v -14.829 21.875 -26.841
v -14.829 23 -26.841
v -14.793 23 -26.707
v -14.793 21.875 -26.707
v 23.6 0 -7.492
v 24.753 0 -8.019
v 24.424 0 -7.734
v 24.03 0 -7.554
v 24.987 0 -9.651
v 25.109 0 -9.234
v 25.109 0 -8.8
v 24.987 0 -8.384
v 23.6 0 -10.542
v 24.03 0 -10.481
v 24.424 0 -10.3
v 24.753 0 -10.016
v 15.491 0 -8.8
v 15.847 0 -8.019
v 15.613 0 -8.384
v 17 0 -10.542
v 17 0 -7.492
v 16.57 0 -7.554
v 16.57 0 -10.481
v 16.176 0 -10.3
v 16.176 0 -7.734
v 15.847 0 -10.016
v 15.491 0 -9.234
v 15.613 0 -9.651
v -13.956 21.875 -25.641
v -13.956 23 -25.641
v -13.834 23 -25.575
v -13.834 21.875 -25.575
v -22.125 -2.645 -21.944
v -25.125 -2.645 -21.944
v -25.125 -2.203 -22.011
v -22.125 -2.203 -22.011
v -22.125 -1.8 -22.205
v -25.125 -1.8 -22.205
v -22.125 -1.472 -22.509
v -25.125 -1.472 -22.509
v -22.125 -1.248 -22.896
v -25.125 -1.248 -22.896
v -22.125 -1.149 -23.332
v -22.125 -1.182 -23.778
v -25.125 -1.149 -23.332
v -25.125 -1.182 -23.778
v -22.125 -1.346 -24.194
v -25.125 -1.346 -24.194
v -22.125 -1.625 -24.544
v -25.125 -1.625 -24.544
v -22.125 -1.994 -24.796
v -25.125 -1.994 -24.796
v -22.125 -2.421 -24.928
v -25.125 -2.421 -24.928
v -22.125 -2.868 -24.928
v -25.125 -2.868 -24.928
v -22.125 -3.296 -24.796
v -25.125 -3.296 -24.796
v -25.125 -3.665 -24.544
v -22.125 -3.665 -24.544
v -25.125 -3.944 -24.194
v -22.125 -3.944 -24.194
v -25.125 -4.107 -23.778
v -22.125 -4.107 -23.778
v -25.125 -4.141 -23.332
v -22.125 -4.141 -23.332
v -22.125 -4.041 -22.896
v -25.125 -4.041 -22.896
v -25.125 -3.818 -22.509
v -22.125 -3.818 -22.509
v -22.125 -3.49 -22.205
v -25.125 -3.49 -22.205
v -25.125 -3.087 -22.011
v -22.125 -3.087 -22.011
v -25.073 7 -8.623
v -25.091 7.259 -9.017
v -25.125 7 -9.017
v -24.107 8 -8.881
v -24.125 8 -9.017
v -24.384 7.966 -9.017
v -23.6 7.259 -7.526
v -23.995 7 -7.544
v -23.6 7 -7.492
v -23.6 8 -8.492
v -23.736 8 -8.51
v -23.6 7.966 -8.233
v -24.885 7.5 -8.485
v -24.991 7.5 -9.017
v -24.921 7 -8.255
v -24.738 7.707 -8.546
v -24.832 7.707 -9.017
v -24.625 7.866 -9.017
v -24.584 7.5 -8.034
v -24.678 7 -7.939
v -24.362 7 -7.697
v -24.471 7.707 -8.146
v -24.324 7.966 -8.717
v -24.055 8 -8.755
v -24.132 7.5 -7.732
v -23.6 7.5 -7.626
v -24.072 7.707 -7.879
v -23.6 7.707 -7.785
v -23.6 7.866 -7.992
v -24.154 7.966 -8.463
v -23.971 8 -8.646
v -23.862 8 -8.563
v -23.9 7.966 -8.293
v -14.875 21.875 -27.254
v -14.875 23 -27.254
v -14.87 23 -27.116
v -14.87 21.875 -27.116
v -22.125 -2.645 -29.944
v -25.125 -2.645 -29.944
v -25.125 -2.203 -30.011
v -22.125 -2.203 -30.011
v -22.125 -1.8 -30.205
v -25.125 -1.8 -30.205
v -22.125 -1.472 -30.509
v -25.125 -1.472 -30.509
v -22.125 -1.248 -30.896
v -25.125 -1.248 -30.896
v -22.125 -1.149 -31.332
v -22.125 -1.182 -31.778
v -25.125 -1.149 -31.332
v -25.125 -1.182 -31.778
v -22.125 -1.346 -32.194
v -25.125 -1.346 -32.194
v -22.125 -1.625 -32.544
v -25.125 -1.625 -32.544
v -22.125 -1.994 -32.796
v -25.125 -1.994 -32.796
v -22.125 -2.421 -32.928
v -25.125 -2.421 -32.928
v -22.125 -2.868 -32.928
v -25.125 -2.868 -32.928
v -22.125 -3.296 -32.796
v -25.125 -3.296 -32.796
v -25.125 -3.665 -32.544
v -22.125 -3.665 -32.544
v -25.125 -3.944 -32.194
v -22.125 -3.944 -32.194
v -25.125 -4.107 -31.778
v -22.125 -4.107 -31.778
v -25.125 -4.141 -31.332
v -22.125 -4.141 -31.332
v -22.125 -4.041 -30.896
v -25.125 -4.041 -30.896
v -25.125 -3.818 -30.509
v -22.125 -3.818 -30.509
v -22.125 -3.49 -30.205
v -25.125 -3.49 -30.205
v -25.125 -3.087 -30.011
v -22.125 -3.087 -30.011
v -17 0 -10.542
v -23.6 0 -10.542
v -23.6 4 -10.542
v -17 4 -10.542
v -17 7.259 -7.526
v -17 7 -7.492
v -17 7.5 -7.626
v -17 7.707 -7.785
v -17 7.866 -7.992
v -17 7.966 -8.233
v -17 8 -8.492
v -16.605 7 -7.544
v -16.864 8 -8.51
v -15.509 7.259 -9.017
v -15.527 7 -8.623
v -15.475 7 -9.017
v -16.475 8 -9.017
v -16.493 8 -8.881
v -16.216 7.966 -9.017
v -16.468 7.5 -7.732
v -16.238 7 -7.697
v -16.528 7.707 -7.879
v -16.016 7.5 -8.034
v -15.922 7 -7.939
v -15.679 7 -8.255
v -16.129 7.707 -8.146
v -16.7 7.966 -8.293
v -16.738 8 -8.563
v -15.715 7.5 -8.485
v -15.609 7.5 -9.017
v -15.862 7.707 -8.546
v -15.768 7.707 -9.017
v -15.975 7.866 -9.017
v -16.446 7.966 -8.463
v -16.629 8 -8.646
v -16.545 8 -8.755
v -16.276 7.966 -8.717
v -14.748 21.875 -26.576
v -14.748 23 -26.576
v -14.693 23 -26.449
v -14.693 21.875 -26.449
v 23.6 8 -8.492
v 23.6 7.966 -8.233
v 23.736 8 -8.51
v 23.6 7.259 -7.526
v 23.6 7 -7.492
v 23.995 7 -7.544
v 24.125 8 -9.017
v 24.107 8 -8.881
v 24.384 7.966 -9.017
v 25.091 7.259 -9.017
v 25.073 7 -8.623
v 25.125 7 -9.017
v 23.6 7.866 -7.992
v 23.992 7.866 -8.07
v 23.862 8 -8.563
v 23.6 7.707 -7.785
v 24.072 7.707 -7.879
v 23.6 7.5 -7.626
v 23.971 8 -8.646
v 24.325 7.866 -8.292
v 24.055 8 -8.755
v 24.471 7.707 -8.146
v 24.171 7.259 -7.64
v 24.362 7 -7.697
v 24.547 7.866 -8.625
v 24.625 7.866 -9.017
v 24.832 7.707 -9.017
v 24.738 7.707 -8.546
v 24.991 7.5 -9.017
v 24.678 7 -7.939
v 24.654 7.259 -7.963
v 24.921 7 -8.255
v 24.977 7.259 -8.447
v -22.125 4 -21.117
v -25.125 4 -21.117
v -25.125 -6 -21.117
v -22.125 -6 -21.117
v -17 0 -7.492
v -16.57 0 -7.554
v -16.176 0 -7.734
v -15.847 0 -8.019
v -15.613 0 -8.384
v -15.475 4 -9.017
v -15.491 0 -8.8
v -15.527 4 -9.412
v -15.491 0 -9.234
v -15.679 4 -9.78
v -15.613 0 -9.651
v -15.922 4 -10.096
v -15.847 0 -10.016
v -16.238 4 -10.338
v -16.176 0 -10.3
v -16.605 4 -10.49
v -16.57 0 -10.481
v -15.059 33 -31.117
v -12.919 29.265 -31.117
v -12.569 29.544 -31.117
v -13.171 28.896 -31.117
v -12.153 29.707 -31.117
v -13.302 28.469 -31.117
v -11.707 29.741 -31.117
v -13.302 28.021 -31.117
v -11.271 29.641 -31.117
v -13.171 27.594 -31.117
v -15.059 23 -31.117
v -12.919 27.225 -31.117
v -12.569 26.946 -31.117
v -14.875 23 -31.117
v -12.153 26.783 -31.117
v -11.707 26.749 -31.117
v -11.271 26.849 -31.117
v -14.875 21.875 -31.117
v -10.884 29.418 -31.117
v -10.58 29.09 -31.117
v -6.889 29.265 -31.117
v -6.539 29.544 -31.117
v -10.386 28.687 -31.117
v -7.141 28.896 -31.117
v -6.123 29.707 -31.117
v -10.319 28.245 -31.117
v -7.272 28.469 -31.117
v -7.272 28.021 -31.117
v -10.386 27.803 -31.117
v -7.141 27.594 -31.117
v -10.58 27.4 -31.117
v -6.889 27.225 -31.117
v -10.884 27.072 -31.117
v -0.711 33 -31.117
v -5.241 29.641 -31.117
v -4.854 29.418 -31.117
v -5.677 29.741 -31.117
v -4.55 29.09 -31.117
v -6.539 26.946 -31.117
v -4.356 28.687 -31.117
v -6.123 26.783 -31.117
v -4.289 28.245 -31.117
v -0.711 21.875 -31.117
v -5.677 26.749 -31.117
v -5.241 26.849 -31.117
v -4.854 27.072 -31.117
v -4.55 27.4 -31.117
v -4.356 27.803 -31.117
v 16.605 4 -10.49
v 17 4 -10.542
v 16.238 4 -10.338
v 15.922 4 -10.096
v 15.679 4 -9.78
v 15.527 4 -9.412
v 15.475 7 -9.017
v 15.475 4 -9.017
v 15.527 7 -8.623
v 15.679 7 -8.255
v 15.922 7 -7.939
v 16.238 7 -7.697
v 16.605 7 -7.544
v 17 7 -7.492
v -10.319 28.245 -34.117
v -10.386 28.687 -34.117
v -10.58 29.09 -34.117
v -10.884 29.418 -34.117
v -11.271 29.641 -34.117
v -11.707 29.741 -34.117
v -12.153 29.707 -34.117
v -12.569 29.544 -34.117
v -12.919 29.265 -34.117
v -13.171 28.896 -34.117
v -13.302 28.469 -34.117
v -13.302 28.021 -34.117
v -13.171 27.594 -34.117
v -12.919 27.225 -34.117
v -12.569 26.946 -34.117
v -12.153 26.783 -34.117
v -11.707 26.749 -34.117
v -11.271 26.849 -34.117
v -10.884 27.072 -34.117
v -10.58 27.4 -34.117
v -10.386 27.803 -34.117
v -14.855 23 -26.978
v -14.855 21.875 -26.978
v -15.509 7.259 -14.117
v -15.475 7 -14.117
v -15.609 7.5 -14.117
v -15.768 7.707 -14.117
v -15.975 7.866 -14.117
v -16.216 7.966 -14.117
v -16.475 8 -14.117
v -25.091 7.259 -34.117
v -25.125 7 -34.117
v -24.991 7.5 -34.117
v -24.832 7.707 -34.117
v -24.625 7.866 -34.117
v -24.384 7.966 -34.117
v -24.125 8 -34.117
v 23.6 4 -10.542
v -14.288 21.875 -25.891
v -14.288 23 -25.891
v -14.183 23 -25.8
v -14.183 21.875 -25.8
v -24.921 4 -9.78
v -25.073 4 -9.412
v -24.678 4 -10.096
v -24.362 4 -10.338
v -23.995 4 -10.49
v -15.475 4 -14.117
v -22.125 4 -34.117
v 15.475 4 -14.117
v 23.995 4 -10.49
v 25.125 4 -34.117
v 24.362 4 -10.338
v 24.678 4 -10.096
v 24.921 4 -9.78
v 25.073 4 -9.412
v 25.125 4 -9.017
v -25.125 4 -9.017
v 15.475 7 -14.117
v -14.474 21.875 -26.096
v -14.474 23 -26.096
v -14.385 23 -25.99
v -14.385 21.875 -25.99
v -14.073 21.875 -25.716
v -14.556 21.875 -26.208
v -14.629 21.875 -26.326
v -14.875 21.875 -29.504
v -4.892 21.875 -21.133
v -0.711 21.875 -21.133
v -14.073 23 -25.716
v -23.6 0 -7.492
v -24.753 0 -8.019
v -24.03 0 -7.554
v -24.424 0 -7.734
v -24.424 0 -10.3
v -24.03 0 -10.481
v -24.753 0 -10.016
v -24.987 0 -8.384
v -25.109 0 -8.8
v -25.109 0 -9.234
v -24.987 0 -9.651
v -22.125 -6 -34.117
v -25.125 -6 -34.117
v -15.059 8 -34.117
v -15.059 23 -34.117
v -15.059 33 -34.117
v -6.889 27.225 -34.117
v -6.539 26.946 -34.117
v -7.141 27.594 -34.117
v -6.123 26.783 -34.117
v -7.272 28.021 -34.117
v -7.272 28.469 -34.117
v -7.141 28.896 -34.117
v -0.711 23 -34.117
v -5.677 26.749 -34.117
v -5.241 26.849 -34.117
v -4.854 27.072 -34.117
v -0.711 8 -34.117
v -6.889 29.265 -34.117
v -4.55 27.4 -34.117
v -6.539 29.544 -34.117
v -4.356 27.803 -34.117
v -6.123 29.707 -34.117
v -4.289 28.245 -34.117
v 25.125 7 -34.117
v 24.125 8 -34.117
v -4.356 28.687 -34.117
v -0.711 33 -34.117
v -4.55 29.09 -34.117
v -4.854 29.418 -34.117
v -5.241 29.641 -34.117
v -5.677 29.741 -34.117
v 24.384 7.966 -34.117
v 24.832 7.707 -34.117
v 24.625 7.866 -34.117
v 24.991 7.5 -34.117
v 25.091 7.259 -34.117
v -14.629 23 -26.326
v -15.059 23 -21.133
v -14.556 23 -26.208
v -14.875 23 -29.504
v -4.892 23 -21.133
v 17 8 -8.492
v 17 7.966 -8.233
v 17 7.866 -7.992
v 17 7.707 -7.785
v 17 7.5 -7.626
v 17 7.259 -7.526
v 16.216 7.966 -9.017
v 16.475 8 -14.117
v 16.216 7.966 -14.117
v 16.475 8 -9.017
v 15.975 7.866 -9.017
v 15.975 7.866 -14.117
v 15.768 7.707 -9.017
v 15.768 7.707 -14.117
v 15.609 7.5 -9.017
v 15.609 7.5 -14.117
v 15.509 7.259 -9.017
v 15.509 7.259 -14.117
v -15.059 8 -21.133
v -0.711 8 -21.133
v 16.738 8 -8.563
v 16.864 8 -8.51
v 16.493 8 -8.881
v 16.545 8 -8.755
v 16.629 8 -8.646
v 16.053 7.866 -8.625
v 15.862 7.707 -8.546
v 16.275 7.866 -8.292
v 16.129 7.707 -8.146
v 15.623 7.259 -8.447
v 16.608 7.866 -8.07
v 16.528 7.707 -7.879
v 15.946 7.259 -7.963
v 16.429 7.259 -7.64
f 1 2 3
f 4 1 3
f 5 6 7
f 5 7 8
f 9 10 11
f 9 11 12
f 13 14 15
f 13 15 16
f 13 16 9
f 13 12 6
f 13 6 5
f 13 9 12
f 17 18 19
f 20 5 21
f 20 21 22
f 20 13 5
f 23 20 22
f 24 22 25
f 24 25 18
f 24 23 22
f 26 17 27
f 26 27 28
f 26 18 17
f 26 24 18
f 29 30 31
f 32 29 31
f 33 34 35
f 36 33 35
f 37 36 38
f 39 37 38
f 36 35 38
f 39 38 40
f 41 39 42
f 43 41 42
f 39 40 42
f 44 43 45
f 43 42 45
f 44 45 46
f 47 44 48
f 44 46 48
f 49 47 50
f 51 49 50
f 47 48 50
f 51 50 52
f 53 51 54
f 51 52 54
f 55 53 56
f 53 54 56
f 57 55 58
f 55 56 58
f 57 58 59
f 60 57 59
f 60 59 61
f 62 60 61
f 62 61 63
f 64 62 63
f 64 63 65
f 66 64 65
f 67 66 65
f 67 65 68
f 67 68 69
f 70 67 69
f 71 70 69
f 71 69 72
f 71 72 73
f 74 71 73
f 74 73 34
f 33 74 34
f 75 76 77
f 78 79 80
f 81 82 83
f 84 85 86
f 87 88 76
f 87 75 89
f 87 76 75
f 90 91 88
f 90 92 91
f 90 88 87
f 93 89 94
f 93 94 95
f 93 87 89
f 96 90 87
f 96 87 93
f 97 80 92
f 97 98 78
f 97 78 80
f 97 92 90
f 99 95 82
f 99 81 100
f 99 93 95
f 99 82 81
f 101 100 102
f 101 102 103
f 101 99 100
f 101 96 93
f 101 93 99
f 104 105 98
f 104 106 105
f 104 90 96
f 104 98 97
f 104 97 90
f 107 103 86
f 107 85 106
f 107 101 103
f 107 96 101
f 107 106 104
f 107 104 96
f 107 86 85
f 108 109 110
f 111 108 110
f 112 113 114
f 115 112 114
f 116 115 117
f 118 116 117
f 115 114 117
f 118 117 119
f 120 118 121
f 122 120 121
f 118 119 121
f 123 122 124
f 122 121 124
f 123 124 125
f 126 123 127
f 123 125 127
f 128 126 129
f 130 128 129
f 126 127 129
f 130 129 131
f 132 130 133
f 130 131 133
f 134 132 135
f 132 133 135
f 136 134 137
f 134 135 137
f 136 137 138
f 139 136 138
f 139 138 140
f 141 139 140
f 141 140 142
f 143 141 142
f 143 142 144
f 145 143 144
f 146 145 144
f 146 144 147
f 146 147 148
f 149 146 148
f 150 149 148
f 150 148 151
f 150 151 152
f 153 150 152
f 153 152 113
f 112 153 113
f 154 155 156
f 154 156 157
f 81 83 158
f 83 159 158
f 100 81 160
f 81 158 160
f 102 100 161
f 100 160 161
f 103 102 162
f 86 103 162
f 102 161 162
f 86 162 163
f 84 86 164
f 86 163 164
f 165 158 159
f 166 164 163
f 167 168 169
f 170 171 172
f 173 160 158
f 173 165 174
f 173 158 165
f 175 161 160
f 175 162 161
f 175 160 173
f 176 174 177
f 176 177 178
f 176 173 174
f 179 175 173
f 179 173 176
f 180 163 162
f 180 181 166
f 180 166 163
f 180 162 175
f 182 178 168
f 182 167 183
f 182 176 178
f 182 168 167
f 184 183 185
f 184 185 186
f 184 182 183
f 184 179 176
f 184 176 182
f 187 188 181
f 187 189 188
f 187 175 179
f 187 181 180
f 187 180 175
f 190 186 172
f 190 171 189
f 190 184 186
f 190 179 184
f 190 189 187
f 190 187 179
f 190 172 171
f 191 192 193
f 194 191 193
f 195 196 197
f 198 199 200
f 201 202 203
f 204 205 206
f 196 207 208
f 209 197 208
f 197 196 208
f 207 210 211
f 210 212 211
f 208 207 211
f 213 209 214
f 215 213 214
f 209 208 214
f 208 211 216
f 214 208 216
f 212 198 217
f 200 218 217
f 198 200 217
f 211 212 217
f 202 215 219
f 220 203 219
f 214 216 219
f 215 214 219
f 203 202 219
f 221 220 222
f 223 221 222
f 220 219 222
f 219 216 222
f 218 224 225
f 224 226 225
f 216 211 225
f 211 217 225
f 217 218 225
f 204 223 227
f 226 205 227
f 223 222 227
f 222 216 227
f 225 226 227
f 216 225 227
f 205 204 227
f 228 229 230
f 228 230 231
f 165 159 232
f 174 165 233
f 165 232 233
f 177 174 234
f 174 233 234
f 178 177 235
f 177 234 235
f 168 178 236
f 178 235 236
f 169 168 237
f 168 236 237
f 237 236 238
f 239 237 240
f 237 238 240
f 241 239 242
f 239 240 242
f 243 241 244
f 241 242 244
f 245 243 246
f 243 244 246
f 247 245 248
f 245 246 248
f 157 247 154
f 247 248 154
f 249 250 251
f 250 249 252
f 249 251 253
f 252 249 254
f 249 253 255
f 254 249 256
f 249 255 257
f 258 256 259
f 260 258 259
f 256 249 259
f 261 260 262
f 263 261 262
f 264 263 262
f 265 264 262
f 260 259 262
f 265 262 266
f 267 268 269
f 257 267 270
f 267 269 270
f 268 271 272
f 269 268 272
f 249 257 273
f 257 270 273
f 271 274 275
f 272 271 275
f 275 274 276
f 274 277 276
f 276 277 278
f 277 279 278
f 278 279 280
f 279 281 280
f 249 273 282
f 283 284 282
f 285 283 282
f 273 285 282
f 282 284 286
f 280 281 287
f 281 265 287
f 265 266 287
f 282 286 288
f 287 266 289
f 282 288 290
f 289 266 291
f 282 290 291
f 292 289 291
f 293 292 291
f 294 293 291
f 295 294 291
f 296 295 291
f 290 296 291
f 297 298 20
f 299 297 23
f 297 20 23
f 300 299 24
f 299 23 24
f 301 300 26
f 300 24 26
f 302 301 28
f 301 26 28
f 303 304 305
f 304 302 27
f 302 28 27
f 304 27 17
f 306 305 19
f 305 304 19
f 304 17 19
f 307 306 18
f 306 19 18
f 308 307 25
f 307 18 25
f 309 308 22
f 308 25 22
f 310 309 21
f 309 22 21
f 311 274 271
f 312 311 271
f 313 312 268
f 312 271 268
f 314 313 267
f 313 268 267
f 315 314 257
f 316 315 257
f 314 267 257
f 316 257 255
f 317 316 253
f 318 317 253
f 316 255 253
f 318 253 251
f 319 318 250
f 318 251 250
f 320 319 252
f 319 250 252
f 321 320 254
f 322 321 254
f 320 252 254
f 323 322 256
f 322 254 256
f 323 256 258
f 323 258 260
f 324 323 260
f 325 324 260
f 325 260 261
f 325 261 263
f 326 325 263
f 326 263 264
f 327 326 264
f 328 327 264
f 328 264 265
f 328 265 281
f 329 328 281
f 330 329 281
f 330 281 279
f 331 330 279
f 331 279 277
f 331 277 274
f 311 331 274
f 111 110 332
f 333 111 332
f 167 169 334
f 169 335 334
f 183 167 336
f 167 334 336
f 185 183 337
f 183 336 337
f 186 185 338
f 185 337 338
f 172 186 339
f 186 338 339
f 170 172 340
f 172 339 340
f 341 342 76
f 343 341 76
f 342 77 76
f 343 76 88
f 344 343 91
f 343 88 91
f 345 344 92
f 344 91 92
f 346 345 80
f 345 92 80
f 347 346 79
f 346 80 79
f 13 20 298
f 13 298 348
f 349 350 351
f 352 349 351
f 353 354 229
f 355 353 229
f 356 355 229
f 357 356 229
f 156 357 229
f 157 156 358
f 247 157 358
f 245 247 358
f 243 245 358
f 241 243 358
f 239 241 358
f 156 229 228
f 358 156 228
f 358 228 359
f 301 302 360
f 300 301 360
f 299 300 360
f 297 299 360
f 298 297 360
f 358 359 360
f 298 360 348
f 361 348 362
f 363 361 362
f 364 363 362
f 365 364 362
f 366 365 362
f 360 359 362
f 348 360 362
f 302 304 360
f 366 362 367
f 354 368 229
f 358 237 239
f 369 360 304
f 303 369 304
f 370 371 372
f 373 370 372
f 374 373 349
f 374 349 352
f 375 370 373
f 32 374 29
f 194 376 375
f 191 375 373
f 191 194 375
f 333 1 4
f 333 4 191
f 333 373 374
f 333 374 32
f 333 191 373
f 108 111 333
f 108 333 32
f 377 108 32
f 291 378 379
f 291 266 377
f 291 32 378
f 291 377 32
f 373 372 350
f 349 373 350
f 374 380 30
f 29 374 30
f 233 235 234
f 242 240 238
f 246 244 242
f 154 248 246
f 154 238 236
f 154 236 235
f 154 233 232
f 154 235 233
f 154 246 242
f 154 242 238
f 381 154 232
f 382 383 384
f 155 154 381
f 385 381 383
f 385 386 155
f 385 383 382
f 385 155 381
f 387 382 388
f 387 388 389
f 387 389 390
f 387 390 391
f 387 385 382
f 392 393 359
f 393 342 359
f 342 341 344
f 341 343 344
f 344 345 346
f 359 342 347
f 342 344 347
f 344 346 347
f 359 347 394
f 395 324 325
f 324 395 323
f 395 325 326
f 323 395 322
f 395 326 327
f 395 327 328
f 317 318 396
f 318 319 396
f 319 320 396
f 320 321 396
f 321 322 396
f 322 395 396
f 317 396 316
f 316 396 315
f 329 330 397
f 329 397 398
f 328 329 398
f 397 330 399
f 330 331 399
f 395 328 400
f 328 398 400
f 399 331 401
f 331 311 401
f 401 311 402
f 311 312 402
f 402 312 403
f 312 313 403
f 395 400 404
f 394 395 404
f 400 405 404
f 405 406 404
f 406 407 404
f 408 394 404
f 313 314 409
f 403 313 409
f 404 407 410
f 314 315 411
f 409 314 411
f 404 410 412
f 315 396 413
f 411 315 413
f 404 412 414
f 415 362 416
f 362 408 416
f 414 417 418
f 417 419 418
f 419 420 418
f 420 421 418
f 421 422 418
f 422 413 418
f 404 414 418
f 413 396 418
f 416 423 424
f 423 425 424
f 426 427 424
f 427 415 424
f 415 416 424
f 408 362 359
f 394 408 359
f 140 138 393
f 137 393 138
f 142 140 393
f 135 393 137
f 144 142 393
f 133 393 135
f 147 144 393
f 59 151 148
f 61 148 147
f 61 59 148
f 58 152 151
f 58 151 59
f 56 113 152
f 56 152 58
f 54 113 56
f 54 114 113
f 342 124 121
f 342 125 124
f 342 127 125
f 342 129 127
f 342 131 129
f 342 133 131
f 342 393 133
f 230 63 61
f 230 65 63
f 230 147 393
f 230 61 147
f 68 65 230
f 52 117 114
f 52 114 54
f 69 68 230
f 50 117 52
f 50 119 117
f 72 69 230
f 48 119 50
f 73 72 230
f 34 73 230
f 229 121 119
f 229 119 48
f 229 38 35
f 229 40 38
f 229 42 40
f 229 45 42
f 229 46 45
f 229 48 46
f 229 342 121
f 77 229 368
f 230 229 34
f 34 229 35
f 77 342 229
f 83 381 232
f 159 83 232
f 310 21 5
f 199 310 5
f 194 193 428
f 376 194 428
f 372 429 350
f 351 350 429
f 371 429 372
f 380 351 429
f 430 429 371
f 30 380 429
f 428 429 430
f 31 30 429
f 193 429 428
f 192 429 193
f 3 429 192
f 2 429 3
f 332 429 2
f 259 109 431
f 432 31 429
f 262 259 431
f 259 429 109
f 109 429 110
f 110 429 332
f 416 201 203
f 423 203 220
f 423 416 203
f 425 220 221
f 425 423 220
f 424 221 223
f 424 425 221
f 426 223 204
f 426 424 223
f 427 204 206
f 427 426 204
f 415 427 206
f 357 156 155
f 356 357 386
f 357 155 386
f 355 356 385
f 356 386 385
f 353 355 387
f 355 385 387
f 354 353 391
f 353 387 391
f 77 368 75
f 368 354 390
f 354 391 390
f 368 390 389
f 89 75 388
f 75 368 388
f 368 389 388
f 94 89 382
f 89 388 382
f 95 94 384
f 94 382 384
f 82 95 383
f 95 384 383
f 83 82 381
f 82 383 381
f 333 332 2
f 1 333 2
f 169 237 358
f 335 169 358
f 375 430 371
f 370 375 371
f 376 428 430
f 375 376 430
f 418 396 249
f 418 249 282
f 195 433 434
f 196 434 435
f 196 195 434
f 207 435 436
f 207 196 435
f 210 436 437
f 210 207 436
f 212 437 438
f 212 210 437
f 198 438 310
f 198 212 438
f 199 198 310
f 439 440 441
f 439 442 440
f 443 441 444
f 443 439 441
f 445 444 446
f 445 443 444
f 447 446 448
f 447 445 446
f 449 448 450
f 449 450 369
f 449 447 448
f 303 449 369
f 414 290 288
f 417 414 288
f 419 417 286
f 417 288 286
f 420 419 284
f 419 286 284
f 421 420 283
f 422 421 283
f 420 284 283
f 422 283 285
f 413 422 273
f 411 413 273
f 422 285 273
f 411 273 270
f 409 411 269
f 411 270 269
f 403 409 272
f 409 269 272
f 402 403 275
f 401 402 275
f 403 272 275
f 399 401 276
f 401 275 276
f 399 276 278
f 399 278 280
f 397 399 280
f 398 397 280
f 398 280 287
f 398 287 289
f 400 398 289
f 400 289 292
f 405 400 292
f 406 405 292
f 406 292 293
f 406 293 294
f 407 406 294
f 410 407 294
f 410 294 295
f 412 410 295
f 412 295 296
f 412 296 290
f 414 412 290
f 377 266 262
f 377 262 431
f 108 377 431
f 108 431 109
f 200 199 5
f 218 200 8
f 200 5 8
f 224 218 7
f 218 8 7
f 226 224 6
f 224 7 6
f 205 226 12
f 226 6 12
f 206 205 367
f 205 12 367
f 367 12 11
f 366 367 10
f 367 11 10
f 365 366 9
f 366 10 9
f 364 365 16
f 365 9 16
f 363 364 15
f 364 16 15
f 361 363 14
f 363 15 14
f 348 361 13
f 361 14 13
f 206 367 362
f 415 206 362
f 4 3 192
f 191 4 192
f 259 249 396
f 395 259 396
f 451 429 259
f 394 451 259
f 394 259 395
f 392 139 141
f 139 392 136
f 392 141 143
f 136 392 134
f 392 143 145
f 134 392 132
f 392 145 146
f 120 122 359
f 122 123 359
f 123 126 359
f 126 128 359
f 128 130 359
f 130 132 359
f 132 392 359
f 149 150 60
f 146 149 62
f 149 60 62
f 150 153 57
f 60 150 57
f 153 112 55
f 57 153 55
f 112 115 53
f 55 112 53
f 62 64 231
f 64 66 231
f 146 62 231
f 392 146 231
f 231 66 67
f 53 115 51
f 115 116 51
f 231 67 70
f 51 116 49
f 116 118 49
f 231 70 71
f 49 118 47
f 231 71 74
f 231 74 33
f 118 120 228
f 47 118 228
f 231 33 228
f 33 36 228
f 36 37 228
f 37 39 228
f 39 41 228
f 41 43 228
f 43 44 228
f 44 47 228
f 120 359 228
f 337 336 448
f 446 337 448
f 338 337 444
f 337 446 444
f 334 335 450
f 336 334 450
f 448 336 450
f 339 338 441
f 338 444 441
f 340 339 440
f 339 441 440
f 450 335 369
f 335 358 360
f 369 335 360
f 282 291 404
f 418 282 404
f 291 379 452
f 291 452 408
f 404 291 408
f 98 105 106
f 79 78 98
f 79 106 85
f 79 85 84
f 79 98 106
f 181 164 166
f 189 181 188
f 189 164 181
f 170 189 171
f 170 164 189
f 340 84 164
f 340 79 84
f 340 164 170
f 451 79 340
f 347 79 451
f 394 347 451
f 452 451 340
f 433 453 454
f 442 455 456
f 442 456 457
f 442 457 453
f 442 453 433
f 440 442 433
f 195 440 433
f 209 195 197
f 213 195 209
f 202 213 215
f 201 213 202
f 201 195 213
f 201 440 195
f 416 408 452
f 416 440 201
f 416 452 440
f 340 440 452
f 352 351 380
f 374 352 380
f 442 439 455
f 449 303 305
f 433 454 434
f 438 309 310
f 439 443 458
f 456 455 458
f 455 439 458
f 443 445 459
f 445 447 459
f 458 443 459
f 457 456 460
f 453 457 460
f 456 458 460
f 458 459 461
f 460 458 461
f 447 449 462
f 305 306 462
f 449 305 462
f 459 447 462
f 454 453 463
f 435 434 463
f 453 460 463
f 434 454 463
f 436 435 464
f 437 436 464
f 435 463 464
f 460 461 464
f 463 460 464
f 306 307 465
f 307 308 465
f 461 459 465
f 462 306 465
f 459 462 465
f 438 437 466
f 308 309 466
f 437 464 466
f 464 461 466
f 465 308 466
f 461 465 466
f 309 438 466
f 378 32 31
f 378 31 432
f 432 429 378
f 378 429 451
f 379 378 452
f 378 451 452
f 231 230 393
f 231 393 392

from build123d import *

# Parameters (mm, degrees)
BOSS_EXTRUDE1_DEPTH   = 4
BOSS_EXTRUDE1_2_DEPTH = 4
BOSS_EXTRUDE3_DEPTH   = 4
FILLET2_R             = 1
SKETCH4_W             = 14.347682942
SKETCH4_H             = 12.983957321
BOSS_EXTRUDE4_DEPTH   = 15
SKETCH6_W             = 14.347682942
SKETCH6_H             = 3
BOSS_EXTRUDE6_DEPTH   = 10
CUT_EXTRUDE1_REACH    = 49.733
SKETCH7_R             = 1.5
CAVITY2_START         = 21.87499999
CAVITY2_DEPTH         = 1.12500001
SKETCH8_W             = 3
SKETCH8_H             = 13
BOSS_EXTRUDE7_DEPTH   = 10
CUT_EXTRUDE2_REACH    = 71.123
SKETCH10_R            = 1.5


# Read off the part's stored shape, not the designer's step: Cavity2
with BuildPart() as part:
    # Sketch1 → Boss-Extrude1 (new body)
    with BuildSketch(Plane(origin=(0, 0, 0), x_dir=(1, 0, 0), z_dir=(0, 1, 0))):
        with BuildLine():
            Line((-23.6, 10.542278437), (-17, 10.542278437))
            ThreePointArc((-17, 10.542278437), (-15.475, 9.017278437), (-17, 7.492278437))
            Line((-17, 7.492278437), (-23.6, 7.492278437))
            ThreePointArc((-23.6, 7.492278437), (-25.125, 9.017278437), (-23.6, 10.542278437))
        make_face()
    extrude(amount=BOSS_EXTRUDE1_DEPTH)



with BuildPart() as body_2:
    # Sketch1 → Boss-Extrude1 2 (new body)
    with BuildSketch(Plane(origin=(0, 0, 0), x_dir=(1, 0, 0), z_dir=(0, 1, 0))):
        with BuildLine():
            Line((23.6, 7.492278437), (17, 7.492278437))
            ThreePointArc((17, 7.492278437), (15.475, 9.017278437), (17, 10.542278437))
            Line((17, 10.542278437), (23.6, 10.542278437))
            ThreePointArc((23.6, 10.542278437), (25.125, 9.017278437), (23.6, 7.492278437))
        make_face()
    extrude(amount=BOSS_EXTRUDE1_2_DEPTH)


with BuildPart() as part_1:
    add(part.part)

    add(body_2.part)  # Boss-Extrude3 merges body 2
    # Sketch3 → Boss-Extrude3 (add)
    with BuildSketch(Plane(origin=(0, 4, 0), x_dir=(1, 0, 0), z_dir=(0, 1, 0))):
        with BuildLine():
            ThreePointArc((15.475, 9.017278437), (15.921662159, 7.938940596), (17, 7.492278437))
            Line((17, 7.492278437), (23.6, 7.492278437))
            ThreePointArc((23.6, 7.492278437), (24.678337841, 7.938940596), (25.125, 9.017278437))
            Line((25.125, 9.017278437), (25.125, 17.305889592))
            Line((25.125, 17.305889592), (25.125, 34.117278437))
            Line((25.125, 34.117278437), (-25.125, 34.117278437))
            Line((-25.125, 34.117278437), (-25.125, 17.305889592))
            Line((-25.125, 17.305889592), (-25.125, 9.017278437))
            ThreePointArc((-25.125, 9.017278437), (-24.678337841, 10.095616278), (-23.6, 10.542278437))
            Line((-23.6, 10.542278437), (-17, 10.542278437))
            ThreePointArc((-17, 10.542278437), (-15.921662159, 10.095616278), (-15.475, 9.017278437))
            Line((-15.475, 9.017278437), (-15.475, 14.117278437))
            Line((-15.475, 14.117278437), (15.475, 14.117278437))
            Line((15.475, 14.117278437), (15.475, 9.017278437))
        make_face()
        with BuildLine():
            Line((-17, 10.542278437), (-23.6, 10.542278437))
            ThreePointArc((-23.6, 10.542278437), (-25.125, 9.017278437), (-23.6, 7.492278437))
            Line((-23.6, 7.492278437), (-17, 7.492278437))
            ThreePointArc((-17, 7.492278437), (-15.475, 9.017278437), (-17, 10.542278437))
        make_face()
    extrude(amount=BOSS_EXTRUDE3_DEPTH)

    # Fillet2
    fillet2_edges = [part_1.edges().sort_by_distance(p)[0] for p in [
        (-25.125, 8, -21.567278437),
        (15.475, 8, -11.567278437),
        (-24.678337841, 8, -7.938940596),
        (-20.3, 8, -7.492278437),
        (-15.921662159, 8, -7.938940596),
        (-15.475, 8, -11.567278437),
        (15.921662159, 8, -7.938940596),
        (20.3, 8, -7.492278437),
        (24.678337841, 8, -7.938940596),
        (25.125, 8, -21.567278437),
    ]]
    fillet(fillet2_edges, radius=FILLET2_R)

    # Sketch4 → Boss-Extrude4 (add)
    with BuildSketch(Plane(origin=(0, 8, 0), x_dir=(1, 0, 0), z_dir=(0, 1, 0))):
        with Locations((-7.885296824, 27.625299777)):
            Rectangle(SKETCH4_W, SKETCH4_H)
    extrude(amount=BOSS_EXTRUDE4_DEPTH)

    # Sketch6 → Boss-Extrude6 (add)
    with BuildSketch(Plane(origin=(0, 23, 0), x_dir=(1, 0, 0), z_dir=(0, 1, 0))):
        with Locations((-7.885296824, 32.617278437)):
            Rectangle(SKETCH6_W, SKETCH6_H)
    extrude(amount=BOSS_EXTRUDE6_DEPTH)

    # Sketch7 → Cut-Extrude1 (cut, up to next)
    with BuildSketch(Plane.XY.offset(-31.117278437), mode=Mode.PRIVATE) as cut_extrude1_sk1:
        with Locations((-11.819138295, 28.245)):
            Circle(SKETCH7_R)
    cut_extrude1_tool1 = extrude(cut_extrude1_sk1.sketch, amount=-CUT_EXTRUDE1_REACH, mode=Mode.PRIVATE) & part_1.part
    # Sketch7 → Cut-Extrude1 (cut, up to next)
    with BuildSketch(Plane.XY.offset(-31.117278437), mode=Mode.PRIVATE) as cut_extrude1_sk2:
        with Locations((-5.789138295, 28.245)):
            Circle(SKETCH7_R)
    cut_extrude1_tool2 = extrude(cut_extrude1_sk2.sketch, amount=-CUT_EXTRUDE1_REACH, mode=Mode.PRIVATE) & part_1.part
    add(cut_extrude1_tool1.solids().sort_by_distance((-11.819138, 28.245, -31.117278))[0], mode=Mode.SUBTRACT)
    add(cut_extrude1_tool2.solids().sort_by_distance((-5.789138, 28.245, -31.117278))[0], mode=Mode.SUBTRACT)

    # Cavity2 outline → Cavity2 (cut)
    with BuildSketch(Plane(origin=(0, 0, 0), x_dir=(1, 0, 0), z_dir=(0, 1, 0)).offset(CAVITY2_START)):
        Polygon((-0.711455353, 21.133321116), (-0.711455353, 31.117278437), (-14.875000136, 31.117278437), (-14.874999824, 29.504253116), (-14.874998603, 27.254253271), (-14.869868878, 27.115654486), (-14.854507644, 26.977814263), (-14.829001512, 26.841486537), (-14.793485992, 26.707417297), (-14.748156659, 26.57633996), (-14.693263575, 26.448972009), (-14.629105695, 26.326010144), (-14.55603366, 26.208127189), (-14.474448405, 26.095968178), (-14.384794172, 25.99014676), (-14.287564095, 25.89124194), (-14.183289029, 25.799794912), (-14.072538942, 25.716306013), (-13.955921523, 25.641232065), (-13.8340724, 25.574983827), (-4.891452092, 21.133285849), align=None)
    extrude(amount=CAVITY2_DEPTH, mode=Mode.SUBTRACT)

    # Sketch8 → Boss-Extrude7 (add)
    with BuildSketch(Plane.XZ.offset(-4)):
        with Locations((-23.625, -27.617278437)):
            Rectangle(SKETCH8_W, SKETCH8_H)
    extrude(amount=BOSS_EXTRUDE7_DEPTH)

    # Sketch10 → Cut-Extrude2 (cut, up to next)
    with BuildSketch(Plane.ZY.offset(25.125), mode=Mode.PRIVATE) as cut_extrude2_sk1:
        with Locations((-23.44448468, -2.644785648)):
            Circle(SKETCH10_R)
    cut_extrude2_tool1 = extrude(cut_extrude2_sk1.sketch, amount=-CUT_EXTRUDE2_REACH, mode=Mode.PRIVATE) & part_1.part
    # Sketch10 → Cut-Extrude2 (cut, up to next)
    with BuildSketch(Plane.ZY.offset(25.125), mode=Mode.PRIVATE) as cut_extrude2_sk2:
        with Locations((-31.44448468, -2.644785648)):
            Circle(SKETCH10_R)
    cut_extrude2_tool2 = extrude(cut_extrude2_sk2.sketch, amount=-CUT_EXTRUDE2_REACH, mode=Mode.PRIVATE) & part_1.part
    add(cut_extrude2_tool1.solids().sort_by_distance((-25.125, -2.644786, -23.444485))[0], mode=Mode.SUBTRACT)
    add(cut_extrude2_tool2.solids().sort_by_distance((-25.125, -2.644786, -31.444485))[0], mode=Mode.SUBTRACT)


solid = part_1.part
